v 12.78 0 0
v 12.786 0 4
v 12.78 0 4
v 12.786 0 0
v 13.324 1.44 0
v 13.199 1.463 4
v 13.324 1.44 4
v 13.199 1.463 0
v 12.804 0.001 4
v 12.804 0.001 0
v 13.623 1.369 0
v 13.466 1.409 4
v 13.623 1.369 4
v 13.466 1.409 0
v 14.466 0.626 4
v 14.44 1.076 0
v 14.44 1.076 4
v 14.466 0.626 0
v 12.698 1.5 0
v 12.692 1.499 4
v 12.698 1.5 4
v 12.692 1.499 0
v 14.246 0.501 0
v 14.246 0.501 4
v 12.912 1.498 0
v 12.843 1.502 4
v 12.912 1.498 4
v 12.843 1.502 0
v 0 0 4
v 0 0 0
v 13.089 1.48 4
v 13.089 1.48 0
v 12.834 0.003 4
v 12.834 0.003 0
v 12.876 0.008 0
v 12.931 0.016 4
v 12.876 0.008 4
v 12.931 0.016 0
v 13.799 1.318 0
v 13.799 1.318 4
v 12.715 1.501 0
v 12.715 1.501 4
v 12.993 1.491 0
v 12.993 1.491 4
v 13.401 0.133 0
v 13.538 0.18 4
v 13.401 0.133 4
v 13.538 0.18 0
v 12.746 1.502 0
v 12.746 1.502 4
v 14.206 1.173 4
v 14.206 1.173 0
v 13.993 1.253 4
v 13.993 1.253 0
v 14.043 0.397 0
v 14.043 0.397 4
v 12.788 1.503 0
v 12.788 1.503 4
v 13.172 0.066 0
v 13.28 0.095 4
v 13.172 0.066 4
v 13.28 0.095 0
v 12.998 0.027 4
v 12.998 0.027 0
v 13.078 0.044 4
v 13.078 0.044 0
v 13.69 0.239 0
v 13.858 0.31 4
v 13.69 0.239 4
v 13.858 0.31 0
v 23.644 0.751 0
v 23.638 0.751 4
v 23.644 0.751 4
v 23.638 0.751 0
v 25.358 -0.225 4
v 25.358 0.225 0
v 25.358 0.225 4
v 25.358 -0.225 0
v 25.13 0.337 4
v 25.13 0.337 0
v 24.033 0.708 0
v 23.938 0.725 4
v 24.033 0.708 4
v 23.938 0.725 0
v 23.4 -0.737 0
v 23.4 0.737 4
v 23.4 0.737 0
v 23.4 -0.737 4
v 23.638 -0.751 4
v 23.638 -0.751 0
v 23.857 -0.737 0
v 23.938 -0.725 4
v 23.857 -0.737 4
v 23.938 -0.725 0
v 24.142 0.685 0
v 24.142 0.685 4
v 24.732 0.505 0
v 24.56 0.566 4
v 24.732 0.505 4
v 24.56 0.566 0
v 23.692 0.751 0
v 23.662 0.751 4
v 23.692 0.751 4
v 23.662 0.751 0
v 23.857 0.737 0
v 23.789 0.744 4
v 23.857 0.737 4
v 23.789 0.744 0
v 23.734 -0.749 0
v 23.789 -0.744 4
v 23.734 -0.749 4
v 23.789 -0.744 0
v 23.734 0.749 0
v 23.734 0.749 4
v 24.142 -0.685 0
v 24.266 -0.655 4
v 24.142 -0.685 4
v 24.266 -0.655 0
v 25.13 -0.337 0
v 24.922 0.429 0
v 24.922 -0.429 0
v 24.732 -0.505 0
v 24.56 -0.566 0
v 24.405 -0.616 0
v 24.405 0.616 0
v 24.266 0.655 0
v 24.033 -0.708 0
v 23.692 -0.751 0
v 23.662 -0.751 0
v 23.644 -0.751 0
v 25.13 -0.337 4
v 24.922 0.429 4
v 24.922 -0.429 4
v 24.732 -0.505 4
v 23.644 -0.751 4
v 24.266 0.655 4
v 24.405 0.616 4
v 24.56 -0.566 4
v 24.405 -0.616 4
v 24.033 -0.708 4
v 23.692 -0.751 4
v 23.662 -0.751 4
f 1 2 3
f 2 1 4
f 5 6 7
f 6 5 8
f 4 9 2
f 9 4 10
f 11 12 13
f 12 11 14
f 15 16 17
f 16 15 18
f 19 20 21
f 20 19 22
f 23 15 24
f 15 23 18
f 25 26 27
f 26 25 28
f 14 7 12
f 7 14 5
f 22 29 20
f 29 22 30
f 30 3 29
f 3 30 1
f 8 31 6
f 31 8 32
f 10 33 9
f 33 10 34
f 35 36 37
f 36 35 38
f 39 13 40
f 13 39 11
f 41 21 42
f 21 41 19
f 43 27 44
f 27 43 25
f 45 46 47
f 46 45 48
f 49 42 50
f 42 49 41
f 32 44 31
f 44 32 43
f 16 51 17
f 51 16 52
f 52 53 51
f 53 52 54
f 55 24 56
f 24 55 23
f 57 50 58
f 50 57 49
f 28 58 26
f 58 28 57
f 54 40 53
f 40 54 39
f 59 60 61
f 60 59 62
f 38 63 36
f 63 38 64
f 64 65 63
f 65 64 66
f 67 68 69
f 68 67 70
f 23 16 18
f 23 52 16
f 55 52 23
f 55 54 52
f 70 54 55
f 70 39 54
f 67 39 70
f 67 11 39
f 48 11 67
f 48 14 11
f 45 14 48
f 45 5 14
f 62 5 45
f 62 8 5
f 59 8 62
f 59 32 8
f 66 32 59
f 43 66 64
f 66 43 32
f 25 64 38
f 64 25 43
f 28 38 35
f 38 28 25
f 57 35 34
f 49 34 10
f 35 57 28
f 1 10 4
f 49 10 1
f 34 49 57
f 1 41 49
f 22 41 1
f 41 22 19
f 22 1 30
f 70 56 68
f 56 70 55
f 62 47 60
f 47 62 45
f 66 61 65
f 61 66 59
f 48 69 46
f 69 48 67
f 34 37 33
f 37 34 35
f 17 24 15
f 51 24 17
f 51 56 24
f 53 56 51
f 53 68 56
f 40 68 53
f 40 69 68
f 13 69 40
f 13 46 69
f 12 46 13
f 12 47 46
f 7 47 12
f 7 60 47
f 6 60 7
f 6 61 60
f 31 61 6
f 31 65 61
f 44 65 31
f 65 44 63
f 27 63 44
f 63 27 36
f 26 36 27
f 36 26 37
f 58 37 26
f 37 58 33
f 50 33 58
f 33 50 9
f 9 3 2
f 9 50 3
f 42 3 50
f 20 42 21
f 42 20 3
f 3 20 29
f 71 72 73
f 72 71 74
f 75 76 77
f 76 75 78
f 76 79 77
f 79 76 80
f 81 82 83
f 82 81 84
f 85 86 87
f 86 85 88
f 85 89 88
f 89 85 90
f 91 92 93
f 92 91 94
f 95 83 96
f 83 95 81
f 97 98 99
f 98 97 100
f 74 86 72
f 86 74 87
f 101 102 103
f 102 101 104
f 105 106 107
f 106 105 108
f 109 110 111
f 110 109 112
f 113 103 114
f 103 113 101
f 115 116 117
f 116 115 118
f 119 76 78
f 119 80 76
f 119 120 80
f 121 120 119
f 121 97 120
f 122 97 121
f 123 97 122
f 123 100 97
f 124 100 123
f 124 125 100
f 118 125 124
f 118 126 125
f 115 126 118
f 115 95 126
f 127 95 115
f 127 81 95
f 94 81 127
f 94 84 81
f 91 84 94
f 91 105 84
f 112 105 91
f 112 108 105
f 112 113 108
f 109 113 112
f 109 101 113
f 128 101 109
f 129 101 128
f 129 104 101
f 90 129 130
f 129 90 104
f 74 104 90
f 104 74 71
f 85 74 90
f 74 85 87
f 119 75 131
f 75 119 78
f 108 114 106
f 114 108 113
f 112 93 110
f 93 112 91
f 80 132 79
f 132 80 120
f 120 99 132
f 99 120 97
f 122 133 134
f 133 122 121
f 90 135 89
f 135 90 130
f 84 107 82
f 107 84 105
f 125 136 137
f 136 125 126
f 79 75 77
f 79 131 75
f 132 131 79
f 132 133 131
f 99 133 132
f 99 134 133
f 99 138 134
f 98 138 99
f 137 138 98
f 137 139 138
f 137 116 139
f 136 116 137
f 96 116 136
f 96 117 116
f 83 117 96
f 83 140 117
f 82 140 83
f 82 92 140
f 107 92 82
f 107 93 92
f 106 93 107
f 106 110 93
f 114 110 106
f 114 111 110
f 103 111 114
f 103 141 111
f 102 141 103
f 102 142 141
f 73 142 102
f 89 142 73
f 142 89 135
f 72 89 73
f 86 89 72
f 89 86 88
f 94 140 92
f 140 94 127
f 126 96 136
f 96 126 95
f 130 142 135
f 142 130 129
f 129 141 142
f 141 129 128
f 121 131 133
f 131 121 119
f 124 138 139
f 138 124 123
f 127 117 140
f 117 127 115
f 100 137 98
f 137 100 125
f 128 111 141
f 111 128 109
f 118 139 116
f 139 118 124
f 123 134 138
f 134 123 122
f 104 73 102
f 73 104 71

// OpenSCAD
// file: ../../../src/common/common_params.scad
/***
 * @module Common Parameters
 * @brief Shared constants and tolerances used by the CurveGears implementation.
 *
 * Historical constants are retained for numerical compatibility.
 */
_cg_pi = 3.14159;
_cg_deg_per_rad = 57.29578;
_cg_tolerance = 1e-7;
_cg_default_fn = 50;
_cg_circle_pi = 3.141592653589793;

/**
 * @module _cg_assert_samples
 * @brief Validate a sampled-curve count while preserving the caller diagnostic.
 * @param samples {integer >= minimum} Requested sample count.
 * @param message {string} Caller-specific diagnostic message.
 * @param minimum {integer, default 120} Minimum supported sample count.
 */
module _cg_assert_samples(samples,message="samples must be an integer >= 120",minimum=120) {
    assert(samples >= minimum && floor(samples)==samples,message);
}
// file: ../../../src/common/common_math.scad
/***
 * @module Common Math
 * @brief Shared scalar, angle and vector helpers used by the geometry layers.
 *
 * These functions are internal implementation primitives and are not part of
 * the public family API.
 */
include <common_params.scad>

/*** @function _cg_degrees(angle)
 * @brief Convert radians to degrees.
 * @param angle {number} Angle in radians.
 * @return {number} Angle in degrees.
 */
function _cg_degrees(angle) = angle*_cg_deg_per_rad;
/*** @function _cg_radians(angle)
 * @brief Convert degrees to radians.
 * @param angle {number} Angle in degrees.
 * @return {number} Angle in radians.
 */
function _cg_radians(angle) = angle/_cg_deg_per_rad;
/*** @function _cg_polar(p)
 * @brief Convert a polar `[radius, angle]` pair to Cartesian coordinates.
 * @param p {array} Polar pair with angle in degrees.
 * @return {array} Cartesian point `[x, y]`.
 */
function _cg_polar(p) = [p[0]*cos(p[1]),p[0]*sin(p[1])];

/*** @function _cg_vsub(a, b)
 * @brief Subtract one two-dimensional vector from another.
 * @param a {array} Left-hand vector.
 * @param b {array} Right-hand vector.
 * @return {array} Difference vector.
 */
function _cg_vsub(a,b) = [a[0]-b[0], a[1]-b[1]];
/*** @function _cg_vlen(a)
 * @brief Calculate the Euclidean length of a two-dimensional vector.
 * @param a {array} Vector.
 * @return {number} Vector length.
 */
function _cg_vlen(a) = sqrt(a[0]*a[0] + a[1]*a[1]);
/*** @function _cg_vunit(a)
 * @brief Normalise a two-dimensional vector, returning zero for a zero vector.
 * @param a {array} Vector.
 * @return {array} Unit vector or `[0, 0]`.
 */
function _cg_vunit(a) = let(l=_cg_vlen(a)) l == 0 ? [0,0] : [a[0]/l,a[1]/l];
/*** @function _cg_lerp(a, b, t)
 * @brief Linearly interpolate between two scalar values.
 * @param a {number} Start value.
 * @param b {number} End value.
 * @param t {number} Interpolation fraction.
 * @return {number} Interpolated value.
 */
function _cg_lerp(a,b,t) = a + t*(b-a);
/*** @function _cg_vlerp(a, b, t)
 * @brief Linearly interpolate between two two-dimensional vectors.
 * @param a {array} Start vector.
 * @param b {array} End vector.
 * @param t {number} Interpolation fraction.
 * @return {array} Interpolated vector.
 */
function _cg_vlerp(a,b,t) = [_cg_lerp(a[0],b[0],t), _cg_lerp(a[1],b[1],t)];
/*** @function _cg_cross2(a, b)
 * @brief Calculate the scalar two-dimensional cross product.
 * @param a {array} First vector.
 * @param b {array} Second vector.
 * @return {number} Signed cross-product magnitude.
 */
function _cg_cross2(a,b) = a[0]*b[1]-a[1]*b[0];
/*** @function _cg_sum(v, i, acc)
 * @brief Sum a scalar array recursively.
 * @param v {array} Scalar values.
 * @param i {integer, default 0} Current index.
 * @param acc {number, default 0} Accumulated sum.
 * @return {number} Sum of the values.
 */
function _cg_sum(v,i=0,acc=0) = i >= len(v) ? acc : _cg_sum(v,i+1,acc+v[i]);
/*** @function _cg_prefix_sums(v, i, acc, out)
 * @brief Build inclusive prefix sums for a scalar array.
 * @param v {array} Scalar values.
 * @param i {integer, default 0} Current index.
 * @param acc {number, default 0} Accumulated sum.
 * @param out {array, default [0]} Prefix-sum output under construction.
 * @return {array} Prefix sums beginning with zero.
 */
function _cg_prefix_sums(v,i=0,acc=0,out=[0]) =
    i >= len(v) ? out : _cg_prefix_sums(v,i+1,acc+v[i],concat(out,[acc+v[i]]));

/*** @function _cg_closed_polyline_perimeter(points)
 * @brief Calculate the perimeter of a closed sampled point list.
 * @param points {array of points} Closed Cartesian polyline.
 * @return {number} Perimeter in the input coordinate units.
 */
function _cg_closed_polyline_perimeter(points) =
    _cg_sum([for(i=[0:len(points)-1])
        _cg_vlen(_cg_vsub(points[(i+1)%len(points)],points[i]))]);

/*** @function _cg_pitch_scale_from_points(modul, tooth_number, unit_points, circumference)
 * @brief Calculate pitch scaling from an existing unit-curve sample.
 * @param modul {number > 0} Tooth module in mm.
 * @param tooth_number {integer >= 3} Requested tooth count.
 * @param unit_points {array of points} Closed unit-curve sample.
 * @param circumference {number > 0, default _cg_pi} Family-selected circumference constant.
 * @return {number} Scale factor for the sampled unit curve.
 */
function _cg_pitch_scale_from_points(modul,tooth_number,unit_points,circumference=_cg_pi) =
    circumference*modul*tooth_number/_cg_closed_polyline_perimeter(unit_points);

/*** @function _cg_scale_points(scale, points)
 * @brief Multiply every sampled point by one scalar.
 * @param scale {number} Point scale factor.
 * @param points {array of points} Cartesian point list.
 * @return {array of points} Scaled Cartesian point list.
 */
function _cg_scale_points(scale,points) = [for(p=points) [scale*p[0],scale*p[1]]];

function _cg_upper_bound_column(tab,target,column,lo,hi) =
    lo>=hi ? max(0,lo) :
    let(mid=floor((lo+hi+1)/2))
    tab[mid][column] <= target
        ? _cg_upper_bound_column(tab,target,column,mid,hi)
        : _cg_upper_bound_column(tab,target,column,lo,mid-1);

/*** @function _cg_interp_x_for_y(tab, target, i)
 * @brief Interpolate an x value at a monotonic y target in a two-column table.
 * @param tab {array} Table of `[x, y]` samples.
 * @param target {number} Target y value.
 * @param i {integer, default 0} Search index.
 * @return {number} Interpolated x value.
 */
function _cg_interp_x_for_y(tab,target,i=0) =
    target < tab[0][1] ? tab[len(tab)-1][0] :
    let(segment=min(len(tab)-2,max(0,_cg_upper_bound_column(tab,target,1,0,len(tab)-1))),
        y0=tab[segment][1],y1=tab[segment+1][1])
    y1>y0 ? _cg_lerp(tab[segment][0],tab[segment+1][0],(target-y0)/(y1-y0)) :
    tab[len(tab)-1][0];

/*** @function _cg_interp_y_for_x(tab, target, i)
 * @brief Interpolate a y value at a monotonic x target in a two-column table.
 * @param tab {array} Table of `[x, y]` samples.
 * @param target {number} Target x value.
 * @param i {integer, default 0} Search index.
 * @return {number} Interpolated y value.
 */
function _cg_interp_y_for_x(tab,target,i=0) =
    target < tab[0][0] ? tab[len(tab)-1][1] :
    let(segment=min(len(tab)-2,max(0,_cg_upper_bound_column(tab,target,0,0,len(tab)-1))),
        x0=tab[segment][0],x1=tab[segment+1][0])
    x1>x0 ? _cg_lerp(tab[segment][1],tab[segment+1][1],(target-x0)/(x1-x0)) :
    tab[len(tab)-1][1];
/***
 * @module Mathematical References
 * @brief Mathematical sources used by the CurveGears families.
 * The ellipse uses the standard parametric ellipse. The lobed family uses a
 * sinusoidally modulated polar radius. The Pascal family uses Pascal's
 * limaçon. The logarithmic spiral follows the standard logarithmic spiral.
 * The epitrochoid follows the rolling-circle construction. The superformula
 * follows Johan Gielis, “A generic geometric transformation that unifies a
 * wide range of natural and abstract shapes”, American Journal of Botany
 * 90(3), 333–338 (2003), DOI 10.3732/ajb.90.3.333.
 * References: https://doi.org/10.3732/ajb.90.3.333
 * Pascal limaçon: https://mathworld.wolfram.com/Limacon.html
 * Logarithmic spiral: https://mathworld.wolfram.com/LogarithmicSpiral.html
 * Epitrochoid: https://mathworld.wolfram.com/Epitrochoid.html
 */
// main file
/***
 * @function tooth_generation_library
 * @brief Focused contract test for the reusable tooth-generation library.
 * Source: [`tooth/generation/library.scad`](tooth/generation/library.scad)
 *
 * Exercise both the calculated polygon and the legacy compatibility module.
 */
include <../../../src/common/tooth/generation.scad>
include <../../../src/common/tooth/placement.scad>

$fn=64;
modul=.8;
tooth_number=34;
pressure_angle=20;
pitch_radius=modul*tooth_number/2;
angles=_cg_tooth_angles(modul,tooth_number,pressure_angle);
polygon_points=_cg_tooth_polygon(modul,tooth_number,pressure_angle);
candidate=_cg_reference_tooth_candidate(pitch_radius,modul,tooth_number,pressure_angle);

assert(abs(_cg_addendum(modul)-.88)<_cg_eps_len(),"tooth addendum contract changed");
assert(_cg_default_clearance(modul)>0,"tooth clearance contract failed");
assert(_cg_dedendum(modul)>0 && _cg_default_backlash(modul)>0,"tooth root contract failed");
assert(angles[0]>0 && angles[1]>angles[0] && angles[2]>0,"tooth angle contract failed");
assert(_cg_polyline_finite(polygon_points),"tooth polygon contains non-finite coordinates");
assert(_cg_polygon_area(polygon_points)>0,"tooth polygon has no area");
assert(candidate[0],str("reference tooth candidate failed: ",candidate[1]));
assert(len(candidate[8])>=6,"reference tooth boundary contract failed");

linear_extrude(height=4,convexity=4)
    polygon(polygon_points);
translate([pitch_radius*1.8,0,0])
    linear_extrude(height=4,convexity=4)
        _cg_involute_tooth(modul,tooth_number,pressure_angle);
